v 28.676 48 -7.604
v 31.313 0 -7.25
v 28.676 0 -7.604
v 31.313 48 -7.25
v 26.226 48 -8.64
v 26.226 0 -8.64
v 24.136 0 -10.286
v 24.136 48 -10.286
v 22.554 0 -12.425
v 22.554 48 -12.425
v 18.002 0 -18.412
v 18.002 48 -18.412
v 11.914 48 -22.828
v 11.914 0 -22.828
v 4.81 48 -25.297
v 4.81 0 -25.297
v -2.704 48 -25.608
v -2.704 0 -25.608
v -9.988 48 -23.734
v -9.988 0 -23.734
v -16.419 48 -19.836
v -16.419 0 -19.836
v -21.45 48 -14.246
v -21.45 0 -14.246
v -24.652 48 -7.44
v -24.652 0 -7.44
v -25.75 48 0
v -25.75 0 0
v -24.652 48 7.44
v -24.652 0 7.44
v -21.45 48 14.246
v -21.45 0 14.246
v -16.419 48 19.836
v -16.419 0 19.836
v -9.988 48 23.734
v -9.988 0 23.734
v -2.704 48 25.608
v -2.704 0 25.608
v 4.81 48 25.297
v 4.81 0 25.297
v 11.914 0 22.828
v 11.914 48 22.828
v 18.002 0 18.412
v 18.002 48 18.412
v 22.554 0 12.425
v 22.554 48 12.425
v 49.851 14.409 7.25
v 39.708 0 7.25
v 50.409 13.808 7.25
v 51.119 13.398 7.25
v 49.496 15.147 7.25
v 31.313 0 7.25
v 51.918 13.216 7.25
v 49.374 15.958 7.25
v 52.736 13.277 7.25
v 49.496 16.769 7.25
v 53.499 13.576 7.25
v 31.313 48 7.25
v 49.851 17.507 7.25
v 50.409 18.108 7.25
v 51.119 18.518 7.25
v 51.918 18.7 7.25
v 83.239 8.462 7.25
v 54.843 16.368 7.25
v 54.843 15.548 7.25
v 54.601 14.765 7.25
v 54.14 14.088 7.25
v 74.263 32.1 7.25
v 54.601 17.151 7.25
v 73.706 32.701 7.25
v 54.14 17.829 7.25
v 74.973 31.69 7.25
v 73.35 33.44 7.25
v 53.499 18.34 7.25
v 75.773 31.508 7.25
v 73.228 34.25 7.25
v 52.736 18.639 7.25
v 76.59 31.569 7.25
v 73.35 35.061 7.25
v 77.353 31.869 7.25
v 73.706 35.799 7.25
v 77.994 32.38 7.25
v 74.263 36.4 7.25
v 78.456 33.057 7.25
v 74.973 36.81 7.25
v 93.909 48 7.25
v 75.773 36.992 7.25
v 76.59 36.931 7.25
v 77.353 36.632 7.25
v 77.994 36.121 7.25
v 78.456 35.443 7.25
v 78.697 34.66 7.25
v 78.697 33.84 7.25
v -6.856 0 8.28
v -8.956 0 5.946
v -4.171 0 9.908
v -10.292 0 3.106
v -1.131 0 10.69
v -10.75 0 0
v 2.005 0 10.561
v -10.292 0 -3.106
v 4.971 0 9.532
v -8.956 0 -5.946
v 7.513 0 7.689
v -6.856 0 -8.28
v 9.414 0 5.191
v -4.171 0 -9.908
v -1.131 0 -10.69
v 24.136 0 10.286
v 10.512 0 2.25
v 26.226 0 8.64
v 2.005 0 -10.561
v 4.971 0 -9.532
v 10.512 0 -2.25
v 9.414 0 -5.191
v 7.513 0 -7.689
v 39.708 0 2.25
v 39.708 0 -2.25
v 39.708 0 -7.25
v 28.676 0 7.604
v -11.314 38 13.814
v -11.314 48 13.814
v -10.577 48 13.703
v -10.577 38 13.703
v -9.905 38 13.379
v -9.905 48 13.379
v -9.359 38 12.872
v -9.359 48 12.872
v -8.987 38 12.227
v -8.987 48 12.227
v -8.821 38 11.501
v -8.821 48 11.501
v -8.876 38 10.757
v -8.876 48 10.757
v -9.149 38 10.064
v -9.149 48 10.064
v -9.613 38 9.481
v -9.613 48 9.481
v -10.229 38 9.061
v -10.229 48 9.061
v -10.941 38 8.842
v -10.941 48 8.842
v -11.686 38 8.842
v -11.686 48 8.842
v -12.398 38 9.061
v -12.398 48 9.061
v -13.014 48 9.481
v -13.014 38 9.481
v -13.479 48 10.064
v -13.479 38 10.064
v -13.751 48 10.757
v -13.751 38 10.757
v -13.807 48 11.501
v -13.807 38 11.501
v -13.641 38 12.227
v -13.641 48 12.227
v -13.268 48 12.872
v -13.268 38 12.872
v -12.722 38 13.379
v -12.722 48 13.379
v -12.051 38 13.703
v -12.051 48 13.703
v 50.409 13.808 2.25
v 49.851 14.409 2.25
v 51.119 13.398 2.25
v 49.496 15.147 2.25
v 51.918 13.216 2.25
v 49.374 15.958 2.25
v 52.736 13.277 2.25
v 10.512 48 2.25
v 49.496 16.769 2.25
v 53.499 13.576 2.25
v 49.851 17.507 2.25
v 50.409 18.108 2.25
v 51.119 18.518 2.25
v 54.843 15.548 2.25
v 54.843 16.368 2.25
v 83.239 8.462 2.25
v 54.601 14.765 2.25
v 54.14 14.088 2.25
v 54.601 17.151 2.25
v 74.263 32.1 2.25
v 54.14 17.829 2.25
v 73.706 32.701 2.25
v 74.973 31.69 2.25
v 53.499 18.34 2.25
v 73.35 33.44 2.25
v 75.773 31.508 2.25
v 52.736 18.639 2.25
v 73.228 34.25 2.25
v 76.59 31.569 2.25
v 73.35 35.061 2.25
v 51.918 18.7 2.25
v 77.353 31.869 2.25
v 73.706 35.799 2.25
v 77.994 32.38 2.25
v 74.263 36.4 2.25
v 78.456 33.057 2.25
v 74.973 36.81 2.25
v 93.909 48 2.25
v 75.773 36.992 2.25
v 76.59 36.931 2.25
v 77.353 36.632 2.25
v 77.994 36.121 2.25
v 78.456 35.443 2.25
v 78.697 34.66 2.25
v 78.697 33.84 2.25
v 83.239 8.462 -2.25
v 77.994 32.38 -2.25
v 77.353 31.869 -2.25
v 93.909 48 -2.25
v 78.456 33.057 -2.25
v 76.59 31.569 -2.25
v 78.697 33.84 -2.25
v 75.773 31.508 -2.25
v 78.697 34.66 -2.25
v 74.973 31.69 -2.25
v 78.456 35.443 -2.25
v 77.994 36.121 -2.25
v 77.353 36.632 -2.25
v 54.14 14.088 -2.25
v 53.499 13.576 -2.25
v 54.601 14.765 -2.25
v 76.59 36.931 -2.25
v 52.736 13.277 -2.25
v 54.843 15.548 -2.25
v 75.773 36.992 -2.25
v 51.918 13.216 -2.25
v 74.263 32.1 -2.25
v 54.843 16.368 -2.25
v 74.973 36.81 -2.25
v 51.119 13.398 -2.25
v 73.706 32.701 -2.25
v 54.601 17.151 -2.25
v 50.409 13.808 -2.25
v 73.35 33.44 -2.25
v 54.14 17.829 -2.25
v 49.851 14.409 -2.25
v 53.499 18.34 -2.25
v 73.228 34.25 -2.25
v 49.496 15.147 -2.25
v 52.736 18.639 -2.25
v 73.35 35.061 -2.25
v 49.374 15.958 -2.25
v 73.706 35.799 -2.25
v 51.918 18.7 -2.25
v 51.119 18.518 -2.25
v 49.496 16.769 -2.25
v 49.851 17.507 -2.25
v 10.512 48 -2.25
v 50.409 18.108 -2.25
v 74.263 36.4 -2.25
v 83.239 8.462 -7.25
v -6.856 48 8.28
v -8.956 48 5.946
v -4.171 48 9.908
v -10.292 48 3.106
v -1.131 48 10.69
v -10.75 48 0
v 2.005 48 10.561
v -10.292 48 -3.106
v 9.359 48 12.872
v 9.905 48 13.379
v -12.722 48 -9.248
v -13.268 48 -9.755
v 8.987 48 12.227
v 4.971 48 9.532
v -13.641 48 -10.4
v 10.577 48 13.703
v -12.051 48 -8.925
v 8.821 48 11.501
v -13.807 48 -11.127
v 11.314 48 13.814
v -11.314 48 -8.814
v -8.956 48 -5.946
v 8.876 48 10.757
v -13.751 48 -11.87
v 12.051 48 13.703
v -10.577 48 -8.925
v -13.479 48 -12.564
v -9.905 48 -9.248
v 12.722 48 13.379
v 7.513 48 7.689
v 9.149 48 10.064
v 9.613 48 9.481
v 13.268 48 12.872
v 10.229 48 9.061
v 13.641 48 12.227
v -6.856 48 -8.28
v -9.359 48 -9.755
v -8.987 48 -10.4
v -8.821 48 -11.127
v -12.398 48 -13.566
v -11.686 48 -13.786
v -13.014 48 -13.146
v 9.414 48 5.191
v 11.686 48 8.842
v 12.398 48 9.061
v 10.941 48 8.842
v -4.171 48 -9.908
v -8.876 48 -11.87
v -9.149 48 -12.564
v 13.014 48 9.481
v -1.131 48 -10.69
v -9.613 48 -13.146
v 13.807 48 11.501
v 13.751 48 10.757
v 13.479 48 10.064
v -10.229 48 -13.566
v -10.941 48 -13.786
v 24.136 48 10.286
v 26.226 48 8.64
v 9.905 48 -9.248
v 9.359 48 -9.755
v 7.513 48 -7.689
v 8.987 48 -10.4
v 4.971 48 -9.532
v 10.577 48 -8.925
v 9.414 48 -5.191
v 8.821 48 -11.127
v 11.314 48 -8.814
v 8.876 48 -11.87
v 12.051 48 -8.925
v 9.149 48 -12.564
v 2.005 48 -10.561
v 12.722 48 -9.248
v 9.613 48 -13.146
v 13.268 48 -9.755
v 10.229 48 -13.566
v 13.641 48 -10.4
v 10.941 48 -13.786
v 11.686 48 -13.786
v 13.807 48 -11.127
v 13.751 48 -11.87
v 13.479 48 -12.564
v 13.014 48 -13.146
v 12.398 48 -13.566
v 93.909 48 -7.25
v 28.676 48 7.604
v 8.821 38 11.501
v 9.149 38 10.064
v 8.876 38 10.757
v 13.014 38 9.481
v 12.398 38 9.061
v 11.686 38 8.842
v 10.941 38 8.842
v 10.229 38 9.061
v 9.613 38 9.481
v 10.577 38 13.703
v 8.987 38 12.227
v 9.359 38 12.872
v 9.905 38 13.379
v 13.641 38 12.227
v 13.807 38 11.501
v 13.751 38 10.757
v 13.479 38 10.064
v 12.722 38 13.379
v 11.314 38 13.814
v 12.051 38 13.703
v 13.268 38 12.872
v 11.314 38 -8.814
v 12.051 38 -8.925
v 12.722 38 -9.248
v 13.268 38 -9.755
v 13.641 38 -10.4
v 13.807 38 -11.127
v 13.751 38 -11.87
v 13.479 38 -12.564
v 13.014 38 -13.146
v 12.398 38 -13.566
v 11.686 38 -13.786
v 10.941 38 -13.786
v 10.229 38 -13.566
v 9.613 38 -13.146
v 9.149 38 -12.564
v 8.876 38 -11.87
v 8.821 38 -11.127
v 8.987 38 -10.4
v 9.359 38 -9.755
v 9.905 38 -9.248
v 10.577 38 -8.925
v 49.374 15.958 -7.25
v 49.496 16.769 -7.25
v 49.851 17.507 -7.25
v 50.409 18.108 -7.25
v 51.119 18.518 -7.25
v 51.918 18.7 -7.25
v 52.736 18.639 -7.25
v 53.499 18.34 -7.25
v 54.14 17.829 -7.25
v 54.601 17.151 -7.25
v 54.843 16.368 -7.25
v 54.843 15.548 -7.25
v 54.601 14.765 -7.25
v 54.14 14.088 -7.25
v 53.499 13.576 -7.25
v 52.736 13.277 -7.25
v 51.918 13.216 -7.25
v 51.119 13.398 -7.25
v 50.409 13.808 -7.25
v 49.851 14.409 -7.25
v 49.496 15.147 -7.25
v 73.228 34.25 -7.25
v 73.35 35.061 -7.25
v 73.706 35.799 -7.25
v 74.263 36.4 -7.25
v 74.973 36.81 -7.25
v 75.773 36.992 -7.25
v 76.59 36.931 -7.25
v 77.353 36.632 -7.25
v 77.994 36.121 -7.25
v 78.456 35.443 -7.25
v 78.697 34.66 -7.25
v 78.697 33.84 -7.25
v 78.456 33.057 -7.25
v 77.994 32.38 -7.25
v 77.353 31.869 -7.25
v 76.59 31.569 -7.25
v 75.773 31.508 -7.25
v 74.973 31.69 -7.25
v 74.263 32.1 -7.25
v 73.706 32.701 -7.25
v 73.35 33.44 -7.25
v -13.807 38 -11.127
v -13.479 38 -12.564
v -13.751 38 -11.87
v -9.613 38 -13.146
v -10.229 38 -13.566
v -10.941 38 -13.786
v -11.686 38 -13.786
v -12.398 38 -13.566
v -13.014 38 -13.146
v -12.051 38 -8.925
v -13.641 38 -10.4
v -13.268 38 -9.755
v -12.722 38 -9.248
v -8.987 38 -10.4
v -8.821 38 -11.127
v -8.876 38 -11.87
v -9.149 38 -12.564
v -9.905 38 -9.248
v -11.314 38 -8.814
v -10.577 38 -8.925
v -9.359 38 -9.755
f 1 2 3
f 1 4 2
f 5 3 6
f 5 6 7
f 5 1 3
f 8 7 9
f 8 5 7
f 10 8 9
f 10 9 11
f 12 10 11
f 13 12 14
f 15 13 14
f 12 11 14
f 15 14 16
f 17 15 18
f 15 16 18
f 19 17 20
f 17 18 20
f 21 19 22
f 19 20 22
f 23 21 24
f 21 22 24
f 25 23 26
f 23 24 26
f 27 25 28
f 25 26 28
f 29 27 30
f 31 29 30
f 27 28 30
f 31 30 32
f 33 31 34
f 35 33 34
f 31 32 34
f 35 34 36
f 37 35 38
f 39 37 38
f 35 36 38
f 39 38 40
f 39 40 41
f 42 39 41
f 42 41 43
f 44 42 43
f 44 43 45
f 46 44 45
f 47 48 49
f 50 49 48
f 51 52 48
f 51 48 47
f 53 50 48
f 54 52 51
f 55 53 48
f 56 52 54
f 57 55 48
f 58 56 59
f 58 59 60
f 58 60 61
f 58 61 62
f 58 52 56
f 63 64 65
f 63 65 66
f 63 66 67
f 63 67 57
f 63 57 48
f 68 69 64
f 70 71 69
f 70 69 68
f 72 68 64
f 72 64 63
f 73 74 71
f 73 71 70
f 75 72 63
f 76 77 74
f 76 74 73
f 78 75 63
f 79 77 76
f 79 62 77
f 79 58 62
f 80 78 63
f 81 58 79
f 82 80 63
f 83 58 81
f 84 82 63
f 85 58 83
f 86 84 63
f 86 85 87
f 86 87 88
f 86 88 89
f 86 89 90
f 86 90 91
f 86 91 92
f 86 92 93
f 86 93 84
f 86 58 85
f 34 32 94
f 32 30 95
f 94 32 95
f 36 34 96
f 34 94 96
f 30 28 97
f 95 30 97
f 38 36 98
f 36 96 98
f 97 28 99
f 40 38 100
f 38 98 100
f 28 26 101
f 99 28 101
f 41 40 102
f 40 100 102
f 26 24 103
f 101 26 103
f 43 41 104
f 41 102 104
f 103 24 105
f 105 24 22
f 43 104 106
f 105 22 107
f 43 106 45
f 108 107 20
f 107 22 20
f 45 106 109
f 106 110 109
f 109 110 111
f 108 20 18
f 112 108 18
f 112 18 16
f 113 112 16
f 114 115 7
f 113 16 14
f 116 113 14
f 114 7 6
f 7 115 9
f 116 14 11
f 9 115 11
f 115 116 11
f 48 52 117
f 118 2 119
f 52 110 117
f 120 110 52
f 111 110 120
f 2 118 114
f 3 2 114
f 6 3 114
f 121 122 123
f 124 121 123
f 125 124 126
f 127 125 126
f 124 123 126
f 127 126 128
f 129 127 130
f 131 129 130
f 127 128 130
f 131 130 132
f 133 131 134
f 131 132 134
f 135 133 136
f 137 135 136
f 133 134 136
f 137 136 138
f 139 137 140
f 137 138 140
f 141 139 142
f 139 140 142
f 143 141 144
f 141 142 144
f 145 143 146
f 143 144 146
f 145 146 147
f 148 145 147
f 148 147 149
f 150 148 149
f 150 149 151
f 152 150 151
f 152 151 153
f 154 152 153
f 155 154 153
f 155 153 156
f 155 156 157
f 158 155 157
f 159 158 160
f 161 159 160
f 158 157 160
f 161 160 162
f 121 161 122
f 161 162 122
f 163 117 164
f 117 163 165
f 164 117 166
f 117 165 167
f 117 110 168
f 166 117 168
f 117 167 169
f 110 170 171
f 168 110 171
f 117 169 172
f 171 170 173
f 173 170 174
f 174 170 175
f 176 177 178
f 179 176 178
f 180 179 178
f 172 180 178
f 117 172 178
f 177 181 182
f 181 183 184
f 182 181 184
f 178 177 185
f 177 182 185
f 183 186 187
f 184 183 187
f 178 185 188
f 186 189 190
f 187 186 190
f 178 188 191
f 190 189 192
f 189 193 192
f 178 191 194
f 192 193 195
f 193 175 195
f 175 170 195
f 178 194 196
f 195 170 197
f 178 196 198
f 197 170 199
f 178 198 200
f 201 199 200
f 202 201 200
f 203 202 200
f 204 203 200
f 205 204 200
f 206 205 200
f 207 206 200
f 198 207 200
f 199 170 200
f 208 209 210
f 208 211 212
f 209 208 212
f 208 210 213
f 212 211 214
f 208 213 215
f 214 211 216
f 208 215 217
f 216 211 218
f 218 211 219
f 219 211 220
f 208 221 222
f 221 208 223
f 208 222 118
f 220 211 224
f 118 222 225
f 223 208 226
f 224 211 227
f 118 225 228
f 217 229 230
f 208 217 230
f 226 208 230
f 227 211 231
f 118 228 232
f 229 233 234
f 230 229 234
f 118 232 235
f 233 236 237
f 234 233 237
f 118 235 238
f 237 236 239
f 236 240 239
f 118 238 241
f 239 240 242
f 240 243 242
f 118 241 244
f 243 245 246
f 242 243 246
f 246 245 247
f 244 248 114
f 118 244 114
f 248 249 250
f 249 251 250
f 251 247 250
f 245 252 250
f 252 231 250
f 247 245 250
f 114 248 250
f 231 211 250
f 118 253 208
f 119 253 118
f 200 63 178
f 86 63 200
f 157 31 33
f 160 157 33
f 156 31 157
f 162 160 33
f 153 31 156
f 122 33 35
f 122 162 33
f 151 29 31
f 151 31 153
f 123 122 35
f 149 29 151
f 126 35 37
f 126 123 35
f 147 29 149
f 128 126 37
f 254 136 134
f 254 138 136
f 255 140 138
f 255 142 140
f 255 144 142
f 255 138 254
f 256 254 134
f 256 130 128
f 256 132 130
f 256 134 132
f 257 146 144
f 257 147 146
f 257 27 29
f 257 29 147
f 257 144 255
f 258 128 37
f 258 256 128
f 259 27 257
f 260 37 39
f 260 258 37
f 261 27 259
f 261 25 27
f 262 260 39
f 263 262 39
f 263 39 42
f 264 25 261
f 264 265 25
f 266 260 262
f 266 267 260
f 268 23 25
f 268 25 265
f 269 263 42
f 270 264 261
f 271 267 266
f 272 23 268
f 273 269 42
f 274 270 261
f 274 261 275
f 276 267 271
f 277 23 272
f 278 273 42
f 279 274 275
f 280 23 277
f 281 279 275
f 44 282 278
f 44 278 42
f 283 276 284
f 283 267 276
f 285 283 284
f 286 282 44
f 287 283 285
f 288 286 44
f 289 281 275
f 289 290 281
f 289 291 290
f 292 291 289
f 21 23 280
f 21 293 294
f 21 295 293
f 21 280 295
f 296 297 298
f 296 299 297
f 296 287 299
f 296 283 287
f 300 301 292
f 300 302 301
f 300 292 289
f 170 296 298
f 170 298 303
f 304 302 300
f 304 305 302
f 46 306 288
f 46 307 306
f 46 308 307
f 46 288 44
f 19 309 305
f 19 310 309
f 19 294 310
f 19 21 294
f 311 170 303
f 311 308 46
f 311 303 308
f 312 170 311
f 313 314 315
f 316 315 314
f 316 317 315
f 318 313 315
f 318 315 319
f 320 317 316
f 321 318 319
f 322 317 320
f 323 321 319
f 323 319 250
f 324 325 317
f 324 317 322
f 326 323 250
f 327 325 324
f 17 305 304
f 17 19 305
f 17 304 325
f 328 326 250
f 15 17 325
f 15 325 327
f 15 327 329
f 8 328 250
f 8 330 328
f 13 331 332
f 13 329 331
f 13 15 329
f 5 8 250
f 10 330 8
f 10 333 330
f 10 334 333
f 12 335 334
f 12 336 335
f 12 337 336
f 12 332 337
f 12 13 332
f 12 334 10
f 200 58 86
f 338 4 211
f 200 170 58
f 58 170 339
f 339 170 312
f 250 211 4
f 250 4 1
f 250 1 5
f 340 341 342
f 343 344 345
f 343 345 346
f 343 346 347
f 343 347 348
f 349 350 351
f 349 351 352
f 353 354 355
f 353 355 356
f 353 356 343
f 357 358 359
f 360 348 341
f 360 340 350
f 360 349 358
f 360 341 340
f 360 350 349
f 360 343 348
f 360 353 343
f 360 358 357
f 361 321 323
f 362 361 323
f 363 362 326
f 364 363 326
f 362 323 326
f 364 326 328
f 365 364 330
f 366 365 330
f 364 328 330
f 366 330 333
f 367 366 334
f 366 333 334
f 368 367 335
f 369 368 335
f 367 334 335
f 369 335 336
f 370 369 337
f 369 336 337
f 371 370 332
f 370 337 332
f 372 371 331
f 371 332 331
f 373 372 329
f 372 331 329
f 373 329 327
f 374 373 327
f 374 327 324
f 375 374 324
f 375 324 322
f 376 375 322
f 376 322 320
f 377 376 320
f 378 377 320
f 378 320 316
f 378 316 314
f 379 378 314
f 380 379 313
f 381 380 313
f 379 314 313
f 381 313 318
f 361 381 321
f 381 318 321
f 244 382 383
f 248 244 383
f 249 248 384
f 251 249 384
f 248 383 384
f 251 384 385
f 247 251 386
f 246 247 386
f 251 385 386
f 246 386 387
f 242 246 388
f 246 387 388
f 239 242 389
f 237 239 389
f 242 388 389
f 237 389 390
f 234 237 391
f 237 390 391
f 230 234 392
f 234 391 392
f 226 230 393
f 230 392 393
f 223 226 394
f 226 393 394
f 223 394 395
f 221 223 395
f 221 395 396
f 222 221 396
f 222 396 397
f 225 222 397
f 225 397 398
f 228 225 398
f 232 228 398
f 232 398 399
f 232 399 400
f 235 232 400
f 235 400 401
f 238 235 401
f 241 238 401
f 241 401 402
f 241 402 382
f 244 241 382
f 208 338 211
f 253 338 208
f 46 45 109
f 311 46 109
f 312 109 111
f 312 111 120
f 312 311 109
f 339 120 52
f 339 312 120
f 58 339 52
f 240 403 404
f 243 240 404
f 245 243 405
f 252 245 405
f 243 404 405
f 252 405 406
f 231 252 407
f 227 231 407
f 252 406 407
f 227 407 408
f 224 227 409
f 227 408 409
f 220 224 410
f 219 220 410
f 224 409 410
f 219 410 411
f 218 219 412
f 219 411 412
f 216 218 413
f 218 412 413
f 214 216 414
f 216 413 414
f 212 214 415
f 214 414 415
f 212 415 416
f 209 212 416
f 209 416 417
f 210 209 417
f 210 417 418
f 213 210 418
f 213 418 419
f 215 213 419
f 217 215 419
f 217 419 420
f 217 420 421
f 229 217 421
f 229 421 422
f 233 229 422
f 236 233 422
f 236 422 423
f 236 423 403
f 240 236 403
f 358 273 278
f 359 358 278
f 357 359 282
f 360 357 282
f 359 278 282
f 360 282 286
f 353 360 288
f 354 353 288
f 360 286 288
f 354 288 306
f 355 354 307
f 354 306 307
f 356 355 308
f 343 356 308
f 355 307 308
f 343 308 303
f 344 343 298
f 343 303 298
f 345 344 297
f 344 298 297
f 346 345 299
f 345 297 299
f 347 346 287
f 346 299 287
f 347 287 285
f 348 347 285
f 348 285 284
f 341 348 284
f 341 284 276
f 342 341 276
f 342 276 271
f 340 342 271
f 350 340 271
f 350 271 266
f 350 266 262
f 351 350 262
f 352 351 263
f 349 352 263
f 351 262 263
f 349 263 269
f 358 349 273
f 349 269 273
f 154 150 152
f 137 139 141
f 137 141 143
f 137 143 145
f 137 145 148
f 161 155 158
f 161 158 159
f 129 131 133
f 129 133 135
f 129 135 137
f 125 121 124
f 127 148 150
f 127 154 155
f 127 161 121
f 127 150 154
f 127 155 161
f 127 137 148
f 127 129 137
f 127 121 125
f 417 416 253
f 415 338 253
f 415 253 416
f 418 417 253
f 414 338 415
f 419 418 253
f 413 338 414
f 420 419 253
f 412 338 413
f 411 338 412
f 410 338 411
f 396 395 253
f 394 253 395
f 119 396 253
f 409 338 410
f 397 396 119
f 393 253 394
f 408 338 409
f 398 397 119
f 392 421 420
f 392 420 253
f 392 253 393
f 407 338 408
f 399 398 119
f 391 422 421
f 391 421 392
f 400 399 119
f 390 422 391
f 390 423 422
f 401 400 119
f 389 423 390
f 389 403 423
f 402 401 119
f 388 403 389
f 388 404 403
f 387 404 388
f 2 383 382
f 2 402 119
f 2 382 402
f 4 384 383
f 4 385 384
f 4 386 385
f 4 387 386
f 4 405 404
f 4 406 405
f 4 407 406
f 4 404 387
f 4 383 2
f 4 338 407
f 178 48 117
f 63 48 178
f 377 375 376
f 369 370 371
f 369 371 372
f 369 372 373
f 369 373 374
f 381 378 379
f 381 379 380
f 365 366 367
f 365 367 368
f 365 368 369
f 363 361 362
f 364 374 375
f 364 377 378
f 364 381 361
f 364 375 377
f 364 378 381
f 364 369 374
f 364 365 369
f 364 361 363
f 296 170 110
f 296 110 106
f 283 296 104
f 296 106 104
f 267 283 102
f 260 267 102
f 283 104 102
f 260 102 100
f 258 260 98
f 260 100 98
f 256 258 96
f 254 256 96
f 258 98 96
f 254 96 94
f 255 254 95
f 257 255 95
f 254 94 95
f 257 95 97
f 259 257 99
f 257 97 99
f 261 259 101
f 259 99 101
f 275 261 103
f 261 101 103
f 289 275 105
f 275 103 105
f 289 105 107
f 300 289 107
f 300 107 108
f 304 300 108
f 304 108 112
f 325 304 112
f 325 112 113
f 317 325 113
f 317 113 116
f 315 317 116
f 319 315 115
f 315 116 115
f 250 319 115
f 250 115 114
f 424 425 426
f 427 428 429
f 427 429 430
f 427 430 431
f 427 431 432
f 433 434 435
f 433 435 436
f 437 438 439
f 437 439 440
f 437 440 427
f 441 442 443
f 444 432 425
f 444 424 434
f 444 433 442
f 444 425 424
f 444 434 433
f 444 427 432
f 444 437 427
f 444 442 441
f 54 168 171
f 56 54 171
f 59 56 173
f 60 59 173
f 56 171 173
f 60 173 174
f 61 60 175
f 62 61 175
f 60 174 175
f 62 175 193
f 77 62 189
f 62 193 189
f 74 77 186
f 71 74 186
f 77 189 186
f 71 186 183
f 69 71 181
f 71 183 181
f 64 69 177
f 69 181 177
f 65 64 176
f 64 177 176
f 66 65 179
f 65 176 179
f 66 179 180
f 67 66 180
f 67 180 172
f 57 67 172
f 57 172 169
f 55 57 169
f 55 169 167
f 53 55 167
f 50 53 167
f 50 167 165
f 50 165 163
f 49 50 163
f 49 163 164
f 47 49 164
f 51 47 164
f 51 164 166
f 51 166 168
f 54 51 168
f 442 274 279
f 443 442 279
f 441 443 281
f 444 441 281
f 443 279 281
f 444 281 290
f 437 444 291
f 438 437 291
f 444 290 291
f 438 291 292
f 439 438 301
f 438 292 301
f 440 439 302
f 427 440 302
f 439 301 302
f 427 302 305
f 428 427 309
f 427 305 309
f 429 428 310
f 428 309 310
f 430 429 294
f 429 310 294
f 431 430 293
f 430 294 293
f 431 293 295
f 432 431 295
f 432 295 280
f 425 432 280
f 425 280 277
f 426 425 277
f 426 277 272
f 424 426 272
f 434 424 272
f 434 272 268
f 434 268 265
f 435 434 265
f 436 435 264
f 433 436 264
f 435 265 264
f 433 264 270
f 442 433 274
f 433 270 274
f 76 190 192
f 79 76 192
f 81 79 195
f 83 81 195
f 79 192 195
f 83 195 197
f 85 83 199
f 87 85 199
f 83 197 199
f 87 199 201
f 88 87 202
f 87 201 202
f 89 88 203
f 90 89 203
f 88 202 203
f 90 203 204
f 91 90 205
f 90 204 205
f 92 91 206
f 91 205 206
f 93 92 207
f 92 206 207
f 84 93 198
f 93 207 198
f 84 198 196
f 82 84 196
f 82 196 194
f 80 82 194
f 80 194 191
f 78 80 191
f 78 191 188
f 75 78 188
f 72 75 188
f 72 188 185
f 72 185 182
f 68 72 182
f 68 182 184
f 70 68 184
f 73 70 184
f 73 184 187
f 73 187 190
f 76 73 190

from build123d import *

# Parameters (mm, degrees)
BOSS_EXTRUDE1_DEPTH = 48
FILLET1_R           = 10
SKETCH5_R           = 2.5
CUT_EXTRUDE3_DEPTH  = 10
BOSS_EXTRUDE2_DEPTH = 5
BOSS_EXTRUDE3_DEPTH = 5
SKETCH8_R           = 2.75
CUT_EXTRUDE4_DEPTH  = 27


with BuildPart() as part:
    # Sketch1 → Boss-Extrude1 (new body)
    with BuildSketch(Plane(origin=(0, 0, 0), x_dir=(1, 0, 0), z_dir=(0, 1, 0))):
        with BuildLine():
            Line((10.511898021, 2.25), (39.708298201, 2.25))
            Line((39.708298201, 2.25), (39.708298201, 7.25))
            Line((39.708298201, 7.25), (24.708298201, 7.25))
            ThreePointArc((24.708298201, 7.25), (-25.75, 0), (24.708298201, -7.25))
            Line((24.708298201, -7.25), (39.708298201, -7.25))
            Line((39.708298201, -7.25), (39.708298201, -2.25))
            Line((39.708298201, -2.25), (10.511898021, -2.25))
            ThreePointArc((10.511898021, -2.25), (-10.75, 0), (10.511898021, 2.25))
        make_face()
    extrude(amount=BOSS_EXTRUDE1_DEPTH)

    # Fillet1
    fillet1_edges = [part.edges().sort_by_distance(p)[0] for p in [
        (24.708298201, 24, 7.25),
        (24.708298201, 24, -7.25),
    ]]
    fillet(fillet1_edges, radius=FILLET1_R)

    # Sketch5 → Cut-Extrude3 (cut)
    with BuildSketch(Plane(origin=(0, 48, 0), x_dir=(1, 0, 0), z_dir=(0, 1, 0))):
        with Locations(Location((-11.313708499, 11.313708499, 0), (0, 0, 270))):
            Circle(SKETCH5_R)
        with Locations(Location((-11.313708499, -11.313708499, 0), (0, 0, 270))):
            Circle(SKETCH5_R)
        with Locations(Location((11.313708499, -11.313708499, 0), (0, 0, 270))):
            Circle(SKETCH5_R)
        with Locations(Location((11.313708499, 11.313708499, 0), (0, 0, 270))):
            Circle(SKETCH5_R)
    extrude(amount=-CUT_EXTRUDE3_DEPTH, mode=Mode.SUBTRACT)

    # Sketch6 → Boss-Extrude2 (add)
    with BuildSketch(Plane.XY.offset(7.25)):
        Polygon((39.708298201, 0), (83.239372469, 8.461583673), (93.909140843, 48), (39.708298201, 48), align=None)
    extrude(amount=-BOSS_EXTRUDE2_DEPTH)

    # Sketch7 → Boss-Extrude3 (add)
    with BuildSketch(Plane(origin=(0, 0, -7.25), x_dir=(-1, 0, 0), z_dir=(0, 0, -1))):
        Polygon((-83.239372469, 8.461583673), (-39.708298201, 0), (-39.708298201, 48), (-93.909140843, 48), align=None)
    extrude(amount=-BOSS_EXTRUDE3_DEPTH)

    # Sketch8 → Cut-Extrude4 (cut)
    with BuildSketch(Plane(origin=(0, 0, -7.25), x_dir=(-1, 0, 0), z_dir=(0, 0, -1))):
        with Locations((-75.978050137, 34.250087132)):
            Circle(SKETCH8_R)
        with Locations((-52.123656454, 15.958069092)):
            Circle(SKETCH8_R)
    extrude(amount=-CUT_EXTRUDE4_DEPTH, mode=Mode.SUBTRACT)


solid = part.part
